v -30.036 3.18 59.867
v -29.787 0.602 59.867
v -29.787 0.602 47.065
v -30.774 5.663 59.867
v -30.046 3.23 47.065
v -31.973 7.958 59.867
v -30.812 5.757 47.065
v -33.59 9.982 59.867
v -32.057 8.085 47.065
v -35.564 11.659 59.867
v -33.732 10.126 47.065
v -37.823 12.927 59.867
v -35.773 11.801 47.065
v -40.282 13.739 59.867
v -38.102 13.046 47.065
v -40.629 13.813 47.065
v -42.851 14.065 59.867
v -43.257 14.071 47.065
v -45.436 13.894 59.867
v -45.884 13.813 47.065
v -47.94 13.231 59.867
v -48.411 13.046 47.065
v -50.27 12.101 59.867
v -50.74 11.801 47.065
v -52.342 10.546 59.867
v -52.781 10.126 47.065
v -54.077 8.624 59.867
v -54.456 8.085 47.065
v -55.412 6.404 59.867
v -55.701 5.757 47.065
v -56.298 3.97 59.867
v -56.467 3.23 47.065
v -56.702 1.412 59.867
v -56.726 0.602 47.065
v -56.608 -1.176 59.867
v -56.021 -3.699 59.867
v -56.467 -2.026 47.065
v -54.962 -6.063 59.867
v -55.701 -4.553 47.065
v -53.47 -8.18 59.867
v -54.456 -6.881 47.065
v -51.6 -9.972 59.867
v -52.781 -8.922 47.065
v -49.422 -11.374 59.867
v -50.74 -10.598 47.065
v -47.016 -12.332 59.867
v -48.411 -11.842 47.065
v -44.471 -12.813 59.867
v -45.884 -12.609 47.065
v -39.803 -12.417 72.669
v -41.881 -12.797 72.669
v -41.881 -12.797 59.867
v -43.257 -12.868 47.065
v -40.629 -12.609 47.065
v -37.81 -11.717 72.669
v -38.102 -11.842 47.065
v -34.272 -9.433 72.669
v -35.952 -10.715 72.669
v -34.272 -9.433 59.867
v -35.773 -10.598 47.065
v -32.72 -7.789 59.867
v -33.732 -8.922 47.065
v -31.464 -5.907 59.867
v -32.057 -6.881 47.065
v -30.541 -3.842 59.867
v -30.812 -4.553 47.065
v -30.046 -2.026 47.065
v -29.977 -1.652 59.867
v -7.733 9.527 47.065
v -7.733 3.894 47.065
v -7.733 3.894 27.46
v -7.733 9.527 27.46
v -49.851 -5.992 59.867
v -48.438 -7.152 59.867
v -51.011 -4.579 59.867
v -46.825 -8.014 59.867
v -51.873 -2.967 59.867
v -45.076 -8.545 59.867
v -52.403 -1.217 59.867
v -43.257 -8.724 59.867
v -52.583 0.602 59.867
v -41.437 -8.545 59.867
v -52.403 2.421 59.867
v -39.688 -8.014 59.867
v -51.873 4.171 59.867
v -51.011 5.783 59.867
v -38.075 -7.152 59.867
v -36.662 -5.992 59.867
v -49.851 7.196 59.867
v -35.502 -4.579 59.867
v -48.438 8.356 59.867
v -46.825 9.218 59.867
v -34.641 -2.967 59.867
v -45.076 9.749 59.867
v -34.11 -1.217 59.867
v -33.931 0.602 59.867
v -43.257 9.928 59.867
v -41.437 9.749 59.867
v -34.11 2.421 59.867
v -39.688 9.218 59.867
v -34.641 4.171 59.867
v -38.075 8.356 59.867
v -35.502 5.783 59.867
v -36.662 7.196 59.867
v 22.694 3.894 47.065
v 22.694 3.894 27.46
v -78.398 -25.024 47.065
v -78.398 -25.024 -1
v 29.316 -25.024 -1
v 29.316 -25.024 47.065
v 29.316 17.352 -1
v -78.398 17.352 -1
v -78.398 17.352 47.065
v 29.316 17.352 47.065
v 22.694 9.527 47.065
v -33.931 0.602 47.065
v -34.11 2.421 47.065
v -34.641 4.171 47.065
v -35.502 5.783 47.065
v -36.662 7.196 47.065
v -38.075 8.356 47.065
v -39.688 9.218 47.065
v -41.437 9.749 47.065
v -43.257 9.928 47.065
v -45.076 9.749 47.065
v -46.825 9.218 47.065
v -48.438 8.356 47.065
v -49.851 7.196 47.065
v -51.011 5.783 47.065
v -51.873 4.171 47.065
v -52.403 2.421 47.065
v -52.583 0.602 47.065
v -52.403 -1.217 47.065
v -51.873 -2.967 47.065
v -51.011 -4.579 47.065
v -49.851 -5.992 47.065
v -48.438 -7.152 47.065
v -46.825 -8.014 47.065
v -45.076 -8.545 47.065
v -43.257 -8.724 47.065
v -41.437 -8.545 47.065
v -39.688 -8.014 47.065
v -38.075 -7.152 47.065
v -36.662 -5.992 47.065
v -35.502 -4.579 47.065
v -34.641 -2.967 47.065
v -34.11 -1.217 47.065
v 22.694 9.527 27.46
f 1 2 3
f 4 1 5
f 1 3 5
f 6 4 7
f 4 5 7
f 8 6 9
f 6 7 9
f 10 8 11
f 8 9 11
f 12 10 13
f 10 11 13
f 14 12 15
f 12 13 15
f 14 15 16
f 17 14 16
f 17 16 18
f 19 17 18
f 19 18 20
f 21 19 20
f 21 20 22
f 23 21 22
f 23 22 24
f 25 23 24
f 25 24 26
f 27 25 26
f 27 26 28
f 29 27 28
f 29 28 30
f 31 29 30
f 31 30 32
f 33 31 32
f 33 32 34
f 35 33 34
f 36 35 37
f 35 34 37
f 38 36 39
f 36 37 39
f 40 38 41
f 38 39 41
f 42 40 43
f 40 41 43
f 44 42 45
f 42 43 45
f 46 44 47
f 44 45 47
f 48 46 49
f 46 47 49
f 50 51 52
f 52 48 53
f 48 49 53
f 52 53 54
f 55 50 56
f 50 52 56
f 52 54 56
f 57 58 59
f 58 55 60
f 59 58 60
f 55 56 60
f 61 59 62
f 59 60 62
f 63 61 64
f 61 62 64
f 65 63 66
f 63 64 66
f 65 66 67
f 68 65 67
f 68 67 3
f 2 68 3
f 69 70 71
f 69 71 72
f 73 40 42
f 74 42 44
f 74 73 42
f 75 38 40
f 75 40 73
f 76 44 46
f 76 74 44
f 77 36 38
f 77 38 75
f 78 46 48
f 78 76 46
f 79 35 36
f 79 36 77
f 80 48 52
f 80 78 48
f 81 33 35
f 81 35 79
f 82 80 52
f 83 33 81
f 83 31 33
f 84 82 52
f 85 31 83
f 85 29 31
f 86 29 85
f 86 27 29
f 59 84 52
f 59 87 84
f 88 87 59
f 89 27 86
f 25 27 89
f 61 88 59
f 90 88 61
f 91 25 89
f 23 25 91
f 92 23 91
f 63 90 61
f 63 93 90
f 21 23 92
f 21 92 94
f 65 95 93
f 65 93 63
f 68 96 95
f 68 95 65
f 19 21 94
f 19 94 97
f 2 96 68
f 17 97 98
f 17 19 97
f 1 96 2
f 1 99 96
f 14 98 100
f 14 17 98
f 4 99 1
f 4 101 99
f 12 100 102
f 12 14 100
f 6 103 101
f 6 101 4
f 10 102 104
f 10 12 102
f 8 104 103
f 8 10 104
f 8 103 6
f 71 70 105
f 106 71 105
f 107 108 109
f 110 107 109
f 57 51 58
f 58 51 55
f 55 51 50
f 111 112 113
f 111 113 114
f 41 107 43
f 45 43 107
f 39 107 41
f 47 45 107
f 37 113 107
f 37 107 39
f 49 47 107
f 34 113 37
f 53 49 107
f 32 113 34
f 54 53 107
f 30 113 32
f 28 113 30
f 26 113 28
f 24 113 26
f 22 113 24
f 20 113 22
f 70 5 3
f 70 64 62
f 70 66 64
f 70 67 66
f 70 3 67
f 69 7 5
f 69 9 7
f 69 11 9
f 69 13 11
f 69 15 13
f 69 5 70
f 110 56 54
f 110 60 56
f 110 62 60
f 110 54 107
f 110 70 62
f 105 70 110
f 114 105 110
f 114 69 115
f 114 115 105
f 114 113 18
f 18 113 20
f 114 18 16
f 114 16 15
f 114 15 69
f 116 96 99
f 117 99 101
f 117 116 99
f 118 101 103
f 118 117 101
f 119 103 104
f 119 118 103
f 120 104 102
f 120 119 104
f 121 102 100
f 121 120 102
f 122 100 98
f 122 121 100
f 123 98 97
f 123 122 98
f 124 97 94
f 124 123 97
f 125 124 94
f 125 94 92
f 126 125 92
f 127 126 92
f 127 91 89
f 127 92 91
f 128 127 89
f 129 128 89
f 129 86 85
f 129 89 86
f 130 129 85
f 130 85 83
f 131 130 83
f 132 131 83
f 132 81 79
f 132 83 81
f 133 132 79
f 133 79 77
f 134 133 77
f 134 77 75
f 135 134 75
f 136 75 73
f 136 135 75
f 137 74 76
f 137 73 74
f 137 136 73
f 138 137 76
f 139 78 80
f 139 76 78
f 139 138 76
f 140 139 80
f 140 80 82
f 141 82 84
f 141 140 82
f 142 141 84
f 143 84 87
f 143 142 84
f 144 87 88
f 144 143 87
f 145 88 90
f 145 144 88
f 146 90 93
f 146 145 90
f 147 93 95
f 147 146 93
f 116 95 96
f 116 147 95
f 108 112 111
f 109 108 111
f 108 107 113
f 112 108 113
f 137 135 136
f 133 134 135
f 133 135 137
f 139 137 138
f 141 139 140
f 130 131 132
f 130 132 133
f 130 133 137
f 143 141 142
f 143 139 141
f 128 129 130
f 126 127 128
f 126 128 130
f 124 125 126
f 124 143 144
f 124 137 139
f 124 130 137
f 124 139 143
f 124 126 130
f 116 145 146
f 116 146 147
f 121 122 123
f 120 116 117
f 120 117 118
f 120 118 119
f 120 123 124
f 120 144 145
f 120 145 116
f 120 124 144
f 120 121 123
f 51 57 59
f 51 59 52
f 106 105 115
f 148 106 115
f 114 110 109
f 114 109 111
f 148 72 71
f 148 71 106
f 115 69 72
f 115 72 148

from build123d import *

# Parameters (mm, degrees)
BOSS_EXTRUDE1_DEPTH      = 47.064502155
BOSS_EXTRUDE1_DEPTH_BACK = 1
SKETCH1_W                = 107.713145043
SKETCH1_H                = 42.376311336
SKETCH2_R                = 13.469541987
SKETCH2_R_2              = 9.325857952
BOSS_EXTRUDE2_DEPTH      = 25.604576726
SKETCH3_OUTSIDE_W        = 137.154
SKETCH3_OUTSIDE_H        = 71.816
CUT_EXTRUDE2_DEPTH       = 12.802288363
SKETCH5_W                = 30.426797769
SKETCH5_H                = 5.633317916
CUT_EXTRUDE3_DEPTH       = 19.604576726


with BuildPart() as part:
    # Sketch1 → Boss-Extrude1 (new, two sides: drawn at the far end of the back side and taken through both)
    with BuildSketch(Plane(origin=(-41.279886751, 0, 0), x_dir=(1, 0, 0), z_dir=(0, 0, 1)).offset(-BOSS_EXTRUDE1_DEPTH_BACK)):
        with Locations((16.738942234, -3.835786802)):
            Rectangle(SKETCH1_W, SKETCH1_H)
    extrude(amount=BOSS_EXTRUDE1_DEPTH + BOSS_EXTRUDE1_DEPTH_BACK)

    # Sketch2 → Boss-Extrude2 (add)
    with BuildSketch(Plane(origin=(-44.843209588, 3.141572349, 47.064502155), x_dir=(1, 0, 0), z_dir=(0, 0, 1))):
        with Locations((1.586562206, -2.539630295)):
            Circle(SKETCH2_R)
        with Locations((1.586562206, -2.539630295)):
            Circle(SKETCH2_R_2, mode=Mode.SUBTRACT)
    extrude(amount=BOSS_EXTRUDE2_DEPTH)

    # Sketch3 outside → Cut-Extrude2 (cut, symmetric)
    with BuildSketch(Plane.XY.offset(72.669078881)):
        with Locations((-24.541, -3.836)):
            Rectangle(SKETCH3_OUTSIDE_W, SKETCH3_OUTSIDE_H)
        Polygon((-18.492947879, -30.338784684), (-15.338367542, -1.062929581), (-42.269291948, -12.968910423), align=None, mode=Mode.SUBTRACT)
    extrude(amount=CUT_EXTRUDE2_DEPTH, both=True, mode=Mode.SUBTRACT)

    # Sketch5 → Cut-Extrude3 (cut)
    with BuildSketch(Plane.XY.offset(47.064502155)):
        with Locations((7.480827718, 6.71069858)):
            Rectangle(SKETCH5_W, SKETCH5_H)
    extrude(amount=-CUT_EXTRUDE3_DEPTH, mode=Mode.SUBTRACT)


solid = part.part
